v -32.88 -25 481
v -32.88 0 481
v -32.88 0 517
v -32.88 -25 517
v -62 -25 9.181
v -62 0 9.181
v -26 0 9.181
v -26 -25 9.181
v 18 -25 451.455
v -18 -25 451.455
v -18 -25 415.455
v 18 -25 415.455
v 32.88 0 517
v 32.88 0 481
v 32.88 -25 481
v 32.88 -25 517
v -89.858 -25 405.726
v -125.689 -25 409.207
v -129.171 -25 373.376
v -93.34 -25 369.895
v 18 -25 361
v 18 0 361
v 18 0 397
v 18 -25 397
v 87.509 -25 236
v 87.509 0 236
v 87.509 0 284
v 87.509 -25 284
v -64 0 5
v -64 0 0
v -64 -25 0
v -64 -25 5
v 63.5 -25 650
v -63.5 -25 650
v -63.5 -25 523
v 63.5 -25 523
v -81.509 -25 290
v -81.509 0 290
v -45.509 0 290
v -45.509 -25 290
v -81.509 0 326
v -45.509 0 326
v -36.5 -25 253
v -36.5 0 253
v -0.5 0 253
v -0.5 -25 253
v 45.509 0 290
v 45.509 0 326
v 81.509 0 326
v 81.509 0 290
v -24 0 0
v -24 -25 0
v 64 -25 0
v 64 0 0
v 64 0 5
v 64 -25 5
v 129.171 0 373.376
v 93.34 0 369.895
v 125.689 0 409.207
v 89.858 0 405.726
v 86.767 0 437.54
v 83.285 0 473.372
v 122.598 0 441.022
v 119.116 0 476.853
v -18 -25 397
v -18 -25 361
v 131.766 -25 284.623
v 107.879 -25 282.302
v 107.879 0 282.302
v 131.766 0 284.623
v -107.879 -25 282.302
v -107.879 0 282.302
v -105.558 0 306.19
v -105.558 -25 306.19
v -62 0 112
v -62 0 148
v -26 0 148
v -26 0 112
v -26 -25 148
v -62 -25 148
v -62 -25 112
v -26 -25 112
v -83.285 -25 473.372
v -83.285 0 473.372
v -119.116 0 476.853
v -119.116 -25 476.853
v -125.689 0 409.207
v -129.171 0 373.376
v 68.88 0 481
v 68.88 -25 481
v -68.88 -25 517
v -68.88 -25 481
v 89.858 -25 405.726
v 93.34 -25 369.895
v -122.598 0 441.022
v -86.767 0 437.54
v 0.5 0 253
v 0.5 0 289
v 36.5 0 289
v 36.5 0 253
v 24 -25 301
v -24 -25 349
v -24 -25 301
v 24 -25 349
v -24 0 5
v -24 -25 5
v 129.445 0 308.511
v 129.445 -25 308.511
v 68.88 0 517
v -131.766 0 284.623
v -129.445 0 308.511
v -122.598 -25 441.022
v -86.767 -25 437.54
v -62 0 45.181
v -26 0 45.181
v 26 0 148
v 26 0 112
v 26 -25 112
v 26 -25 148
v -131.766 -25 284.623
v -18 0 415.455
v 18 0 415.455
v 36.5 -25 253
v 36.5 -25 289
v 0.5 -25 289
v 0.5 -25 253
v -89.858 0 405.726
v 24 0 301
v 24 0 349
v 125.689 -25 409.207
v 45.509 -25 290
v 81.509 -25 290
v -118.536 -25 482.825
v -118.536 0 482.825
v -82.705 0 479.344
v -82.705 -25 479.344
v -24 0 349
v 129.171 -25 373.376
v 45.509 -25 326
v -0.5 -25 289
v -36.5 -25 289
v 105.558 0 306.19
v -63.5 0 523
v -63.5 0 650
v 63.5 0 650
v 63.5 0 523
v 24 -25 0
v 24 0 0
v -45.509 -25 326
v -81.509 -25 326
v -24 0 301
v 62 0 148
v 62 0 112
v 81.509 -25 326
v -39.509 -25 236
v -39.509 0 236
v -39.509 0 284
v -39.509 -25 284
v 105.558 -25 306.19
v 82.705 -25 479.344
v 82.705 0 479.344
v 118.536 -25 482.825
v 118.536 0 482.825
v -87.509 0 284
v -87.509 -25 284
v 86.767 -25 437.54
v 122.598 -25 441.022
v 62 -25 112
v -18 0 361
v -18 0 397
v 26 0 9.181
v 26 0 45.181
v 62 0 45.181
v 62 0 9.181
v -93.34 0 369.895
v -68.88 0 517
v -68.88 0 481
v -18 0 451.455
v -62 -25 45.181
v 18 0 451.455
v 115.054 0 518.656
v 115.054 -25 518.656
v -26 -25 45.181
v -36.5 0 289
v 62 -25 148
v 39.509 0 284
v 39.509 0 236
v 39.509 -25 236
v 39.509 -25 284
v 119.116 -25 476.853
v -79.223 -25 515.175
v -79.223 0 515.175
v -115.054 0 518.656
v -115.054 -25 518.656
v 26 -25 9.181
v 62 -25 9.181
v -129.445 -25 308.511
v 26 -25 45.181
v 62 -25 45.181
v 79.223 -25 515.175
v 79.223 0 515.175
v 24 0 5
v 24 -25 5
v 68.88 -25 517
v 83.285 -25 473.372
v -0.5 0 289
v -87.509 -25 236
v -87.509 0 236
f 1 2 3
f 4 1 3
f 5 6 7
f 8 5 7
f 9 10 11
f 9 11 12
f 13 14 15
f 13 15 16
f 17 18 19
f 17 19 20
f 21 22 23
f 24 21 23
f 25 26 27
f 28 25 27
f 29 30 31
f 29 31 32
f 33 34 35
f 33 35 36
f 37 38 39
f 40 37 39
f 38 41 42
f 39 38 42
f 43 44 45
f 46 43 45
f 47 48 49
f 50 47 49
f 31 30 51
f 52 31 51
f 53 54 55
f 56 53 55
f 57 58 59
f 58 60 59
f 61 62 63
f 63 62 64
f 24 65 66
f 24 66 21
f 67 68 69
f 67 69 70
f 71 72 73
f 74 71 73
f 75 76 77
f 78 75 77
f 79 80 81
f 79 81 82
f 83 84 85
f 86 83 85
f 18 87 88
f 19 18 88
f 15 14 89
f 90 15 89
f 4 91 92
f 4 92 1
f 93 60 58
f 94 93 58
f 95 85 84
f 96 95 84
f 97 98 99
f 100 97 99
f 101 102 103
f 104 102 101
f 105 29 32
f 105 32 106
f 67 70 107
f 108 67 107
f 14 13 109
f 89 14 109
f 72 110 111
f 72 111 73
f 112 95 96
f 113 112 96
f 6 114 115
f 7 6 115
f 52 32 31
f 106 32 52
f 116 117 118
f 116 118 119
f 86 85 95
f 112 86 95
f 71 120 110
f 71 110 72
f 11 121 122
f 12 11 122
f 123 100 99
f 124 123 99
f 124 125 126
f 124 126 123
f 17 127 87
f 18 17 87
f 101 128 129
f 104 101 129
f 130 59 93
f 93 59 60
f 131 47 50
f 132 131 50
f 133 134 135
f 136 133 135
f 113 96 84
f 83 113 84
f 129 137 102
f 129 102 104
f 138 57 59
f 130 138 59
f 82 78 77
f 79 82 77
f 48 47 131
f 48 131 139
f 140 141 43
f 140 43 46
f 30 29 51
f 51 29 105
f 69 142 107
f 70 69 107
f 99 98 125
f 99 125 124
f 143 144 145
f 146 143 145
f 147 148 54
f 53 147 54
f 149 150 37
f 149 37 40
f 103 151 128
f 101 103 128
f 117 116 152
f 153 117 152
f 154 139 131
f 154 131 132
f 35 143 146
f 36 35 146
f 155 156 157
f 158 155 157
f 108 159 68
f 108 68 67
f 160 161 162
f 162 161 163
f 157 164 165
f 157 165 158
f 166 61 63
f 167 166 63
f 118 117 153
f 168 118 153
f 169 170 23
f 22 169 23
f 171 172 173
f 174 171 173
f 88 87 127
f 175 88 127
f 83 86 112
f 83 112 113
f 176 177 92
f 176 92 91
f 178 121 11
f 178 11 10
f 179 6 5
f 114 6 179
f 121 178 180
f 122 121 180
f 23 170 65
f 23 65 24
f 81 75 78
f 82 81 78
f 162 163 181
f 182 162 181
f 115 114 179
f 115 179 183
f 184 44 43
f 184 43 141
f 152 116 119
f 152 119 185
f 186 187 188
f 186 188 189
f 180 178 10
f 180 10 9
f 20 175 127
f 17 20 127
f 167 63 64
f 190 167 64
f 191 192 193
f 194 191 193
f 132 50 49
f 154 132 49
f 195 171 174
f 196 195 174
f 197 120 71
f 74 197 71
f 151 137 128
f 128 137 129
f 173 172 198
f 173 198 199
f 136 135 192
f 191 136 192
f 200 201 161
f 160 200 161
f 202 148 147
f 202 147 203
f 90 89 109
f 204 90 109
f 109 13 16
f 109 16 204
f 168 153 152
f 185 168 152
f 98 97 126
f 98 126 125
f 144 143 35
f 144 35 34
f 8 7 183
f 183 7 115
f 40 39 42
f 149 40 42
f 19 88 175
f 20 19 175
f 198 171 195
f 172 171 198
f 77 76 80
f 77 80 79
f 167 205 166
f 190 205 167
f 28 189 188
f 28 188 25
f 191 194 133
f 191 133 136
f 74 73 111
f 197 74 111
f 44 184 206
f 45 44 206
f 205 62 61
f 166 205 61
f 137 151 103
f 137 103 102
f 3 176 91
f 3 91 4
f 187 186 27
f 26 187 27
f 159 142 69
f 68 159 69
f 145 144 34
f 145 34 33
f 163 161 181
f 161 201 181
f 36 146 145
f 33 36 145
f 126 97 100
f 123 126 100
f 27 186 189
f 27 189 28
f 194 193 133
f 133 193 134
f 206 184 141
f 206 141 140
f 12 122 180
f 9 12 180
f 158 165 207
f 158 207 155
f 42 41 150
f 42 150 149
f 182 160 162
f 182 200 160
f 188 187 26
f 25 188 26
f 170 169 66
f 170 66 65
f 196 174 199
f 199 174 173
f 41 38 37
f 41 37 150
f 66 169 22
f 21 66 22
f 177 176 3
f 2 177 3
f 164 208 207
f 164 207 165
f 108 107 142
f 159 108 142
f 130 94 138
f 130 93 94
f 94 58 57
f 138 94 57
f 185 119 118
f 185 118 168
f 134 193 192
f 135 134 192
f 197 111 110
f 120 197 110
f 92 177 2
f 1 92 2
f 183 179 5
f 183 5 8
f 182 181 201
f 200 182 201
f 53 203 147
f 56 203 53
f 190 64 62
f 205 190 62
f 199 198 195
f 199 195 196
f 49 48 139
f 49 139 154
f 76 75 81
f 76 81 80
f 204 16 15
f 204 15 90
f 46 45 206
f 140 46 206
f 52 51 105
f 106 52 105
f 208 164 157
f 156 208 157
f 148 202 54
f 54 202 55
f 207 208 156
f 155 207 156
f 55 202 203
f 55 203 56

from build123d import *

# Parameters (mm, degrees)
F1_W     = 36
F1_H     = 36
F1_W_2   = 48
F1_H_2   = 48
F1_W_3   = 127
F1_H_3   = 127
F1_W_4   = 40
F1_H_4   = 5
F2_DEPTH = 25


with BuildPart() as f2:
    # F1 (on Front) → F2 (new body)
    with BuildSketch(Plane.XZ):
        with Locations((44, 27.18115)):
            Rectangle(F1_W, F1_H)
        with Locations((44, 130)):
            Rectangle(F1_W, F1_H)
        with Locations((63.508555, 260)):
            Rectangle(F1_W_2, F1_H_2)
        with Locations((63.508555, 308)):
            Rectangle(F1_W, F1_H)
        with Locations((18.5, 271)):
            Rectangle(F1_W, F1_H)
        with Locations((0, 325)):
            Rectangle(F1_W_2, F1_H_2)
        with Locations((0, 379)):
            Rectangle(F1_W, F1_H)
        with Locations((0, 433.454706)):
            Rectangle(F1_W, F1_H)
        with Locations((-44, 27.18115)):
            Rectangle(F1_W, F1_H)
        with Locations((-63.508555, 308)):
            Rectangle(F1_W, F1_H)
        with Locations((-63.508555, 260)):
            Rectangle(F1_W_2, F1_H_2)
        with Locations((-18.5, 271)):
            Rectangle(F1_W, F1_H)
        with Locations((-44, 130)):
            Rectangle(F1_W, F1_H)
        with Locations((50.879549, 499)):
            Rectangle(F1_W, F1_H)
        Polygon((93.33957, 369.894603), (129.170818, 373.37622), (125.689201, 409.207468), (89.857953, 405.725851), align=None)
        Polygon((86.766621, 437.540444), (122.597869, 441.022062), (119.116252, 476.85331), (83.285004, 473.371692), align=None)
        Polygon((82.704734, 479.343567), (118.535982, 482.825185), (115.054364, 518.656433), (79.223116, 515.174815), align=None)
        Polygon((105.557865, 306.189522), (107.878943, 282.302023), (131.766442, 284.623102), (129.445363, 308.5106), align=None)
        Polygon((-119.116252, 476.85331), (-122.597869, 441.022062), (-86.766621, 437.540444), (-83.285004, 473.371692), align=None)
        Polygon((-107.878943, 282.302023), (-105.557865, 306.189522), (-129.445363, 308.5106), (-131.766442, 284.623102), align=None)
        Polygon((-115.054364, 518.656433), (-118.535982, 482.825185), (-82.704734, 479.343567), (-79.223116, 515.174815), align=None)
        with Locations((-50.879549, 499)):
            Rectangle(F1_W, F1_H)
        Polygon((-125.689201, 409.207468), (-129.170818, 373.37622), (-93.33957, 369.894603), (-89.857953, 405.725851), align=None)
        with Locations((0, 586.5)):
            Rectangle(F1_W_3, F1_H_3)
        with Locations((44, 2.5)):
            Rectangle(F1_W_4, F1_H_4)
        with Locations((-44, 2.5)):
            Rectangle(F1_W_4, F1_H_4)
    extrude(amount=F2_DEPTH)


solid = f2.part
